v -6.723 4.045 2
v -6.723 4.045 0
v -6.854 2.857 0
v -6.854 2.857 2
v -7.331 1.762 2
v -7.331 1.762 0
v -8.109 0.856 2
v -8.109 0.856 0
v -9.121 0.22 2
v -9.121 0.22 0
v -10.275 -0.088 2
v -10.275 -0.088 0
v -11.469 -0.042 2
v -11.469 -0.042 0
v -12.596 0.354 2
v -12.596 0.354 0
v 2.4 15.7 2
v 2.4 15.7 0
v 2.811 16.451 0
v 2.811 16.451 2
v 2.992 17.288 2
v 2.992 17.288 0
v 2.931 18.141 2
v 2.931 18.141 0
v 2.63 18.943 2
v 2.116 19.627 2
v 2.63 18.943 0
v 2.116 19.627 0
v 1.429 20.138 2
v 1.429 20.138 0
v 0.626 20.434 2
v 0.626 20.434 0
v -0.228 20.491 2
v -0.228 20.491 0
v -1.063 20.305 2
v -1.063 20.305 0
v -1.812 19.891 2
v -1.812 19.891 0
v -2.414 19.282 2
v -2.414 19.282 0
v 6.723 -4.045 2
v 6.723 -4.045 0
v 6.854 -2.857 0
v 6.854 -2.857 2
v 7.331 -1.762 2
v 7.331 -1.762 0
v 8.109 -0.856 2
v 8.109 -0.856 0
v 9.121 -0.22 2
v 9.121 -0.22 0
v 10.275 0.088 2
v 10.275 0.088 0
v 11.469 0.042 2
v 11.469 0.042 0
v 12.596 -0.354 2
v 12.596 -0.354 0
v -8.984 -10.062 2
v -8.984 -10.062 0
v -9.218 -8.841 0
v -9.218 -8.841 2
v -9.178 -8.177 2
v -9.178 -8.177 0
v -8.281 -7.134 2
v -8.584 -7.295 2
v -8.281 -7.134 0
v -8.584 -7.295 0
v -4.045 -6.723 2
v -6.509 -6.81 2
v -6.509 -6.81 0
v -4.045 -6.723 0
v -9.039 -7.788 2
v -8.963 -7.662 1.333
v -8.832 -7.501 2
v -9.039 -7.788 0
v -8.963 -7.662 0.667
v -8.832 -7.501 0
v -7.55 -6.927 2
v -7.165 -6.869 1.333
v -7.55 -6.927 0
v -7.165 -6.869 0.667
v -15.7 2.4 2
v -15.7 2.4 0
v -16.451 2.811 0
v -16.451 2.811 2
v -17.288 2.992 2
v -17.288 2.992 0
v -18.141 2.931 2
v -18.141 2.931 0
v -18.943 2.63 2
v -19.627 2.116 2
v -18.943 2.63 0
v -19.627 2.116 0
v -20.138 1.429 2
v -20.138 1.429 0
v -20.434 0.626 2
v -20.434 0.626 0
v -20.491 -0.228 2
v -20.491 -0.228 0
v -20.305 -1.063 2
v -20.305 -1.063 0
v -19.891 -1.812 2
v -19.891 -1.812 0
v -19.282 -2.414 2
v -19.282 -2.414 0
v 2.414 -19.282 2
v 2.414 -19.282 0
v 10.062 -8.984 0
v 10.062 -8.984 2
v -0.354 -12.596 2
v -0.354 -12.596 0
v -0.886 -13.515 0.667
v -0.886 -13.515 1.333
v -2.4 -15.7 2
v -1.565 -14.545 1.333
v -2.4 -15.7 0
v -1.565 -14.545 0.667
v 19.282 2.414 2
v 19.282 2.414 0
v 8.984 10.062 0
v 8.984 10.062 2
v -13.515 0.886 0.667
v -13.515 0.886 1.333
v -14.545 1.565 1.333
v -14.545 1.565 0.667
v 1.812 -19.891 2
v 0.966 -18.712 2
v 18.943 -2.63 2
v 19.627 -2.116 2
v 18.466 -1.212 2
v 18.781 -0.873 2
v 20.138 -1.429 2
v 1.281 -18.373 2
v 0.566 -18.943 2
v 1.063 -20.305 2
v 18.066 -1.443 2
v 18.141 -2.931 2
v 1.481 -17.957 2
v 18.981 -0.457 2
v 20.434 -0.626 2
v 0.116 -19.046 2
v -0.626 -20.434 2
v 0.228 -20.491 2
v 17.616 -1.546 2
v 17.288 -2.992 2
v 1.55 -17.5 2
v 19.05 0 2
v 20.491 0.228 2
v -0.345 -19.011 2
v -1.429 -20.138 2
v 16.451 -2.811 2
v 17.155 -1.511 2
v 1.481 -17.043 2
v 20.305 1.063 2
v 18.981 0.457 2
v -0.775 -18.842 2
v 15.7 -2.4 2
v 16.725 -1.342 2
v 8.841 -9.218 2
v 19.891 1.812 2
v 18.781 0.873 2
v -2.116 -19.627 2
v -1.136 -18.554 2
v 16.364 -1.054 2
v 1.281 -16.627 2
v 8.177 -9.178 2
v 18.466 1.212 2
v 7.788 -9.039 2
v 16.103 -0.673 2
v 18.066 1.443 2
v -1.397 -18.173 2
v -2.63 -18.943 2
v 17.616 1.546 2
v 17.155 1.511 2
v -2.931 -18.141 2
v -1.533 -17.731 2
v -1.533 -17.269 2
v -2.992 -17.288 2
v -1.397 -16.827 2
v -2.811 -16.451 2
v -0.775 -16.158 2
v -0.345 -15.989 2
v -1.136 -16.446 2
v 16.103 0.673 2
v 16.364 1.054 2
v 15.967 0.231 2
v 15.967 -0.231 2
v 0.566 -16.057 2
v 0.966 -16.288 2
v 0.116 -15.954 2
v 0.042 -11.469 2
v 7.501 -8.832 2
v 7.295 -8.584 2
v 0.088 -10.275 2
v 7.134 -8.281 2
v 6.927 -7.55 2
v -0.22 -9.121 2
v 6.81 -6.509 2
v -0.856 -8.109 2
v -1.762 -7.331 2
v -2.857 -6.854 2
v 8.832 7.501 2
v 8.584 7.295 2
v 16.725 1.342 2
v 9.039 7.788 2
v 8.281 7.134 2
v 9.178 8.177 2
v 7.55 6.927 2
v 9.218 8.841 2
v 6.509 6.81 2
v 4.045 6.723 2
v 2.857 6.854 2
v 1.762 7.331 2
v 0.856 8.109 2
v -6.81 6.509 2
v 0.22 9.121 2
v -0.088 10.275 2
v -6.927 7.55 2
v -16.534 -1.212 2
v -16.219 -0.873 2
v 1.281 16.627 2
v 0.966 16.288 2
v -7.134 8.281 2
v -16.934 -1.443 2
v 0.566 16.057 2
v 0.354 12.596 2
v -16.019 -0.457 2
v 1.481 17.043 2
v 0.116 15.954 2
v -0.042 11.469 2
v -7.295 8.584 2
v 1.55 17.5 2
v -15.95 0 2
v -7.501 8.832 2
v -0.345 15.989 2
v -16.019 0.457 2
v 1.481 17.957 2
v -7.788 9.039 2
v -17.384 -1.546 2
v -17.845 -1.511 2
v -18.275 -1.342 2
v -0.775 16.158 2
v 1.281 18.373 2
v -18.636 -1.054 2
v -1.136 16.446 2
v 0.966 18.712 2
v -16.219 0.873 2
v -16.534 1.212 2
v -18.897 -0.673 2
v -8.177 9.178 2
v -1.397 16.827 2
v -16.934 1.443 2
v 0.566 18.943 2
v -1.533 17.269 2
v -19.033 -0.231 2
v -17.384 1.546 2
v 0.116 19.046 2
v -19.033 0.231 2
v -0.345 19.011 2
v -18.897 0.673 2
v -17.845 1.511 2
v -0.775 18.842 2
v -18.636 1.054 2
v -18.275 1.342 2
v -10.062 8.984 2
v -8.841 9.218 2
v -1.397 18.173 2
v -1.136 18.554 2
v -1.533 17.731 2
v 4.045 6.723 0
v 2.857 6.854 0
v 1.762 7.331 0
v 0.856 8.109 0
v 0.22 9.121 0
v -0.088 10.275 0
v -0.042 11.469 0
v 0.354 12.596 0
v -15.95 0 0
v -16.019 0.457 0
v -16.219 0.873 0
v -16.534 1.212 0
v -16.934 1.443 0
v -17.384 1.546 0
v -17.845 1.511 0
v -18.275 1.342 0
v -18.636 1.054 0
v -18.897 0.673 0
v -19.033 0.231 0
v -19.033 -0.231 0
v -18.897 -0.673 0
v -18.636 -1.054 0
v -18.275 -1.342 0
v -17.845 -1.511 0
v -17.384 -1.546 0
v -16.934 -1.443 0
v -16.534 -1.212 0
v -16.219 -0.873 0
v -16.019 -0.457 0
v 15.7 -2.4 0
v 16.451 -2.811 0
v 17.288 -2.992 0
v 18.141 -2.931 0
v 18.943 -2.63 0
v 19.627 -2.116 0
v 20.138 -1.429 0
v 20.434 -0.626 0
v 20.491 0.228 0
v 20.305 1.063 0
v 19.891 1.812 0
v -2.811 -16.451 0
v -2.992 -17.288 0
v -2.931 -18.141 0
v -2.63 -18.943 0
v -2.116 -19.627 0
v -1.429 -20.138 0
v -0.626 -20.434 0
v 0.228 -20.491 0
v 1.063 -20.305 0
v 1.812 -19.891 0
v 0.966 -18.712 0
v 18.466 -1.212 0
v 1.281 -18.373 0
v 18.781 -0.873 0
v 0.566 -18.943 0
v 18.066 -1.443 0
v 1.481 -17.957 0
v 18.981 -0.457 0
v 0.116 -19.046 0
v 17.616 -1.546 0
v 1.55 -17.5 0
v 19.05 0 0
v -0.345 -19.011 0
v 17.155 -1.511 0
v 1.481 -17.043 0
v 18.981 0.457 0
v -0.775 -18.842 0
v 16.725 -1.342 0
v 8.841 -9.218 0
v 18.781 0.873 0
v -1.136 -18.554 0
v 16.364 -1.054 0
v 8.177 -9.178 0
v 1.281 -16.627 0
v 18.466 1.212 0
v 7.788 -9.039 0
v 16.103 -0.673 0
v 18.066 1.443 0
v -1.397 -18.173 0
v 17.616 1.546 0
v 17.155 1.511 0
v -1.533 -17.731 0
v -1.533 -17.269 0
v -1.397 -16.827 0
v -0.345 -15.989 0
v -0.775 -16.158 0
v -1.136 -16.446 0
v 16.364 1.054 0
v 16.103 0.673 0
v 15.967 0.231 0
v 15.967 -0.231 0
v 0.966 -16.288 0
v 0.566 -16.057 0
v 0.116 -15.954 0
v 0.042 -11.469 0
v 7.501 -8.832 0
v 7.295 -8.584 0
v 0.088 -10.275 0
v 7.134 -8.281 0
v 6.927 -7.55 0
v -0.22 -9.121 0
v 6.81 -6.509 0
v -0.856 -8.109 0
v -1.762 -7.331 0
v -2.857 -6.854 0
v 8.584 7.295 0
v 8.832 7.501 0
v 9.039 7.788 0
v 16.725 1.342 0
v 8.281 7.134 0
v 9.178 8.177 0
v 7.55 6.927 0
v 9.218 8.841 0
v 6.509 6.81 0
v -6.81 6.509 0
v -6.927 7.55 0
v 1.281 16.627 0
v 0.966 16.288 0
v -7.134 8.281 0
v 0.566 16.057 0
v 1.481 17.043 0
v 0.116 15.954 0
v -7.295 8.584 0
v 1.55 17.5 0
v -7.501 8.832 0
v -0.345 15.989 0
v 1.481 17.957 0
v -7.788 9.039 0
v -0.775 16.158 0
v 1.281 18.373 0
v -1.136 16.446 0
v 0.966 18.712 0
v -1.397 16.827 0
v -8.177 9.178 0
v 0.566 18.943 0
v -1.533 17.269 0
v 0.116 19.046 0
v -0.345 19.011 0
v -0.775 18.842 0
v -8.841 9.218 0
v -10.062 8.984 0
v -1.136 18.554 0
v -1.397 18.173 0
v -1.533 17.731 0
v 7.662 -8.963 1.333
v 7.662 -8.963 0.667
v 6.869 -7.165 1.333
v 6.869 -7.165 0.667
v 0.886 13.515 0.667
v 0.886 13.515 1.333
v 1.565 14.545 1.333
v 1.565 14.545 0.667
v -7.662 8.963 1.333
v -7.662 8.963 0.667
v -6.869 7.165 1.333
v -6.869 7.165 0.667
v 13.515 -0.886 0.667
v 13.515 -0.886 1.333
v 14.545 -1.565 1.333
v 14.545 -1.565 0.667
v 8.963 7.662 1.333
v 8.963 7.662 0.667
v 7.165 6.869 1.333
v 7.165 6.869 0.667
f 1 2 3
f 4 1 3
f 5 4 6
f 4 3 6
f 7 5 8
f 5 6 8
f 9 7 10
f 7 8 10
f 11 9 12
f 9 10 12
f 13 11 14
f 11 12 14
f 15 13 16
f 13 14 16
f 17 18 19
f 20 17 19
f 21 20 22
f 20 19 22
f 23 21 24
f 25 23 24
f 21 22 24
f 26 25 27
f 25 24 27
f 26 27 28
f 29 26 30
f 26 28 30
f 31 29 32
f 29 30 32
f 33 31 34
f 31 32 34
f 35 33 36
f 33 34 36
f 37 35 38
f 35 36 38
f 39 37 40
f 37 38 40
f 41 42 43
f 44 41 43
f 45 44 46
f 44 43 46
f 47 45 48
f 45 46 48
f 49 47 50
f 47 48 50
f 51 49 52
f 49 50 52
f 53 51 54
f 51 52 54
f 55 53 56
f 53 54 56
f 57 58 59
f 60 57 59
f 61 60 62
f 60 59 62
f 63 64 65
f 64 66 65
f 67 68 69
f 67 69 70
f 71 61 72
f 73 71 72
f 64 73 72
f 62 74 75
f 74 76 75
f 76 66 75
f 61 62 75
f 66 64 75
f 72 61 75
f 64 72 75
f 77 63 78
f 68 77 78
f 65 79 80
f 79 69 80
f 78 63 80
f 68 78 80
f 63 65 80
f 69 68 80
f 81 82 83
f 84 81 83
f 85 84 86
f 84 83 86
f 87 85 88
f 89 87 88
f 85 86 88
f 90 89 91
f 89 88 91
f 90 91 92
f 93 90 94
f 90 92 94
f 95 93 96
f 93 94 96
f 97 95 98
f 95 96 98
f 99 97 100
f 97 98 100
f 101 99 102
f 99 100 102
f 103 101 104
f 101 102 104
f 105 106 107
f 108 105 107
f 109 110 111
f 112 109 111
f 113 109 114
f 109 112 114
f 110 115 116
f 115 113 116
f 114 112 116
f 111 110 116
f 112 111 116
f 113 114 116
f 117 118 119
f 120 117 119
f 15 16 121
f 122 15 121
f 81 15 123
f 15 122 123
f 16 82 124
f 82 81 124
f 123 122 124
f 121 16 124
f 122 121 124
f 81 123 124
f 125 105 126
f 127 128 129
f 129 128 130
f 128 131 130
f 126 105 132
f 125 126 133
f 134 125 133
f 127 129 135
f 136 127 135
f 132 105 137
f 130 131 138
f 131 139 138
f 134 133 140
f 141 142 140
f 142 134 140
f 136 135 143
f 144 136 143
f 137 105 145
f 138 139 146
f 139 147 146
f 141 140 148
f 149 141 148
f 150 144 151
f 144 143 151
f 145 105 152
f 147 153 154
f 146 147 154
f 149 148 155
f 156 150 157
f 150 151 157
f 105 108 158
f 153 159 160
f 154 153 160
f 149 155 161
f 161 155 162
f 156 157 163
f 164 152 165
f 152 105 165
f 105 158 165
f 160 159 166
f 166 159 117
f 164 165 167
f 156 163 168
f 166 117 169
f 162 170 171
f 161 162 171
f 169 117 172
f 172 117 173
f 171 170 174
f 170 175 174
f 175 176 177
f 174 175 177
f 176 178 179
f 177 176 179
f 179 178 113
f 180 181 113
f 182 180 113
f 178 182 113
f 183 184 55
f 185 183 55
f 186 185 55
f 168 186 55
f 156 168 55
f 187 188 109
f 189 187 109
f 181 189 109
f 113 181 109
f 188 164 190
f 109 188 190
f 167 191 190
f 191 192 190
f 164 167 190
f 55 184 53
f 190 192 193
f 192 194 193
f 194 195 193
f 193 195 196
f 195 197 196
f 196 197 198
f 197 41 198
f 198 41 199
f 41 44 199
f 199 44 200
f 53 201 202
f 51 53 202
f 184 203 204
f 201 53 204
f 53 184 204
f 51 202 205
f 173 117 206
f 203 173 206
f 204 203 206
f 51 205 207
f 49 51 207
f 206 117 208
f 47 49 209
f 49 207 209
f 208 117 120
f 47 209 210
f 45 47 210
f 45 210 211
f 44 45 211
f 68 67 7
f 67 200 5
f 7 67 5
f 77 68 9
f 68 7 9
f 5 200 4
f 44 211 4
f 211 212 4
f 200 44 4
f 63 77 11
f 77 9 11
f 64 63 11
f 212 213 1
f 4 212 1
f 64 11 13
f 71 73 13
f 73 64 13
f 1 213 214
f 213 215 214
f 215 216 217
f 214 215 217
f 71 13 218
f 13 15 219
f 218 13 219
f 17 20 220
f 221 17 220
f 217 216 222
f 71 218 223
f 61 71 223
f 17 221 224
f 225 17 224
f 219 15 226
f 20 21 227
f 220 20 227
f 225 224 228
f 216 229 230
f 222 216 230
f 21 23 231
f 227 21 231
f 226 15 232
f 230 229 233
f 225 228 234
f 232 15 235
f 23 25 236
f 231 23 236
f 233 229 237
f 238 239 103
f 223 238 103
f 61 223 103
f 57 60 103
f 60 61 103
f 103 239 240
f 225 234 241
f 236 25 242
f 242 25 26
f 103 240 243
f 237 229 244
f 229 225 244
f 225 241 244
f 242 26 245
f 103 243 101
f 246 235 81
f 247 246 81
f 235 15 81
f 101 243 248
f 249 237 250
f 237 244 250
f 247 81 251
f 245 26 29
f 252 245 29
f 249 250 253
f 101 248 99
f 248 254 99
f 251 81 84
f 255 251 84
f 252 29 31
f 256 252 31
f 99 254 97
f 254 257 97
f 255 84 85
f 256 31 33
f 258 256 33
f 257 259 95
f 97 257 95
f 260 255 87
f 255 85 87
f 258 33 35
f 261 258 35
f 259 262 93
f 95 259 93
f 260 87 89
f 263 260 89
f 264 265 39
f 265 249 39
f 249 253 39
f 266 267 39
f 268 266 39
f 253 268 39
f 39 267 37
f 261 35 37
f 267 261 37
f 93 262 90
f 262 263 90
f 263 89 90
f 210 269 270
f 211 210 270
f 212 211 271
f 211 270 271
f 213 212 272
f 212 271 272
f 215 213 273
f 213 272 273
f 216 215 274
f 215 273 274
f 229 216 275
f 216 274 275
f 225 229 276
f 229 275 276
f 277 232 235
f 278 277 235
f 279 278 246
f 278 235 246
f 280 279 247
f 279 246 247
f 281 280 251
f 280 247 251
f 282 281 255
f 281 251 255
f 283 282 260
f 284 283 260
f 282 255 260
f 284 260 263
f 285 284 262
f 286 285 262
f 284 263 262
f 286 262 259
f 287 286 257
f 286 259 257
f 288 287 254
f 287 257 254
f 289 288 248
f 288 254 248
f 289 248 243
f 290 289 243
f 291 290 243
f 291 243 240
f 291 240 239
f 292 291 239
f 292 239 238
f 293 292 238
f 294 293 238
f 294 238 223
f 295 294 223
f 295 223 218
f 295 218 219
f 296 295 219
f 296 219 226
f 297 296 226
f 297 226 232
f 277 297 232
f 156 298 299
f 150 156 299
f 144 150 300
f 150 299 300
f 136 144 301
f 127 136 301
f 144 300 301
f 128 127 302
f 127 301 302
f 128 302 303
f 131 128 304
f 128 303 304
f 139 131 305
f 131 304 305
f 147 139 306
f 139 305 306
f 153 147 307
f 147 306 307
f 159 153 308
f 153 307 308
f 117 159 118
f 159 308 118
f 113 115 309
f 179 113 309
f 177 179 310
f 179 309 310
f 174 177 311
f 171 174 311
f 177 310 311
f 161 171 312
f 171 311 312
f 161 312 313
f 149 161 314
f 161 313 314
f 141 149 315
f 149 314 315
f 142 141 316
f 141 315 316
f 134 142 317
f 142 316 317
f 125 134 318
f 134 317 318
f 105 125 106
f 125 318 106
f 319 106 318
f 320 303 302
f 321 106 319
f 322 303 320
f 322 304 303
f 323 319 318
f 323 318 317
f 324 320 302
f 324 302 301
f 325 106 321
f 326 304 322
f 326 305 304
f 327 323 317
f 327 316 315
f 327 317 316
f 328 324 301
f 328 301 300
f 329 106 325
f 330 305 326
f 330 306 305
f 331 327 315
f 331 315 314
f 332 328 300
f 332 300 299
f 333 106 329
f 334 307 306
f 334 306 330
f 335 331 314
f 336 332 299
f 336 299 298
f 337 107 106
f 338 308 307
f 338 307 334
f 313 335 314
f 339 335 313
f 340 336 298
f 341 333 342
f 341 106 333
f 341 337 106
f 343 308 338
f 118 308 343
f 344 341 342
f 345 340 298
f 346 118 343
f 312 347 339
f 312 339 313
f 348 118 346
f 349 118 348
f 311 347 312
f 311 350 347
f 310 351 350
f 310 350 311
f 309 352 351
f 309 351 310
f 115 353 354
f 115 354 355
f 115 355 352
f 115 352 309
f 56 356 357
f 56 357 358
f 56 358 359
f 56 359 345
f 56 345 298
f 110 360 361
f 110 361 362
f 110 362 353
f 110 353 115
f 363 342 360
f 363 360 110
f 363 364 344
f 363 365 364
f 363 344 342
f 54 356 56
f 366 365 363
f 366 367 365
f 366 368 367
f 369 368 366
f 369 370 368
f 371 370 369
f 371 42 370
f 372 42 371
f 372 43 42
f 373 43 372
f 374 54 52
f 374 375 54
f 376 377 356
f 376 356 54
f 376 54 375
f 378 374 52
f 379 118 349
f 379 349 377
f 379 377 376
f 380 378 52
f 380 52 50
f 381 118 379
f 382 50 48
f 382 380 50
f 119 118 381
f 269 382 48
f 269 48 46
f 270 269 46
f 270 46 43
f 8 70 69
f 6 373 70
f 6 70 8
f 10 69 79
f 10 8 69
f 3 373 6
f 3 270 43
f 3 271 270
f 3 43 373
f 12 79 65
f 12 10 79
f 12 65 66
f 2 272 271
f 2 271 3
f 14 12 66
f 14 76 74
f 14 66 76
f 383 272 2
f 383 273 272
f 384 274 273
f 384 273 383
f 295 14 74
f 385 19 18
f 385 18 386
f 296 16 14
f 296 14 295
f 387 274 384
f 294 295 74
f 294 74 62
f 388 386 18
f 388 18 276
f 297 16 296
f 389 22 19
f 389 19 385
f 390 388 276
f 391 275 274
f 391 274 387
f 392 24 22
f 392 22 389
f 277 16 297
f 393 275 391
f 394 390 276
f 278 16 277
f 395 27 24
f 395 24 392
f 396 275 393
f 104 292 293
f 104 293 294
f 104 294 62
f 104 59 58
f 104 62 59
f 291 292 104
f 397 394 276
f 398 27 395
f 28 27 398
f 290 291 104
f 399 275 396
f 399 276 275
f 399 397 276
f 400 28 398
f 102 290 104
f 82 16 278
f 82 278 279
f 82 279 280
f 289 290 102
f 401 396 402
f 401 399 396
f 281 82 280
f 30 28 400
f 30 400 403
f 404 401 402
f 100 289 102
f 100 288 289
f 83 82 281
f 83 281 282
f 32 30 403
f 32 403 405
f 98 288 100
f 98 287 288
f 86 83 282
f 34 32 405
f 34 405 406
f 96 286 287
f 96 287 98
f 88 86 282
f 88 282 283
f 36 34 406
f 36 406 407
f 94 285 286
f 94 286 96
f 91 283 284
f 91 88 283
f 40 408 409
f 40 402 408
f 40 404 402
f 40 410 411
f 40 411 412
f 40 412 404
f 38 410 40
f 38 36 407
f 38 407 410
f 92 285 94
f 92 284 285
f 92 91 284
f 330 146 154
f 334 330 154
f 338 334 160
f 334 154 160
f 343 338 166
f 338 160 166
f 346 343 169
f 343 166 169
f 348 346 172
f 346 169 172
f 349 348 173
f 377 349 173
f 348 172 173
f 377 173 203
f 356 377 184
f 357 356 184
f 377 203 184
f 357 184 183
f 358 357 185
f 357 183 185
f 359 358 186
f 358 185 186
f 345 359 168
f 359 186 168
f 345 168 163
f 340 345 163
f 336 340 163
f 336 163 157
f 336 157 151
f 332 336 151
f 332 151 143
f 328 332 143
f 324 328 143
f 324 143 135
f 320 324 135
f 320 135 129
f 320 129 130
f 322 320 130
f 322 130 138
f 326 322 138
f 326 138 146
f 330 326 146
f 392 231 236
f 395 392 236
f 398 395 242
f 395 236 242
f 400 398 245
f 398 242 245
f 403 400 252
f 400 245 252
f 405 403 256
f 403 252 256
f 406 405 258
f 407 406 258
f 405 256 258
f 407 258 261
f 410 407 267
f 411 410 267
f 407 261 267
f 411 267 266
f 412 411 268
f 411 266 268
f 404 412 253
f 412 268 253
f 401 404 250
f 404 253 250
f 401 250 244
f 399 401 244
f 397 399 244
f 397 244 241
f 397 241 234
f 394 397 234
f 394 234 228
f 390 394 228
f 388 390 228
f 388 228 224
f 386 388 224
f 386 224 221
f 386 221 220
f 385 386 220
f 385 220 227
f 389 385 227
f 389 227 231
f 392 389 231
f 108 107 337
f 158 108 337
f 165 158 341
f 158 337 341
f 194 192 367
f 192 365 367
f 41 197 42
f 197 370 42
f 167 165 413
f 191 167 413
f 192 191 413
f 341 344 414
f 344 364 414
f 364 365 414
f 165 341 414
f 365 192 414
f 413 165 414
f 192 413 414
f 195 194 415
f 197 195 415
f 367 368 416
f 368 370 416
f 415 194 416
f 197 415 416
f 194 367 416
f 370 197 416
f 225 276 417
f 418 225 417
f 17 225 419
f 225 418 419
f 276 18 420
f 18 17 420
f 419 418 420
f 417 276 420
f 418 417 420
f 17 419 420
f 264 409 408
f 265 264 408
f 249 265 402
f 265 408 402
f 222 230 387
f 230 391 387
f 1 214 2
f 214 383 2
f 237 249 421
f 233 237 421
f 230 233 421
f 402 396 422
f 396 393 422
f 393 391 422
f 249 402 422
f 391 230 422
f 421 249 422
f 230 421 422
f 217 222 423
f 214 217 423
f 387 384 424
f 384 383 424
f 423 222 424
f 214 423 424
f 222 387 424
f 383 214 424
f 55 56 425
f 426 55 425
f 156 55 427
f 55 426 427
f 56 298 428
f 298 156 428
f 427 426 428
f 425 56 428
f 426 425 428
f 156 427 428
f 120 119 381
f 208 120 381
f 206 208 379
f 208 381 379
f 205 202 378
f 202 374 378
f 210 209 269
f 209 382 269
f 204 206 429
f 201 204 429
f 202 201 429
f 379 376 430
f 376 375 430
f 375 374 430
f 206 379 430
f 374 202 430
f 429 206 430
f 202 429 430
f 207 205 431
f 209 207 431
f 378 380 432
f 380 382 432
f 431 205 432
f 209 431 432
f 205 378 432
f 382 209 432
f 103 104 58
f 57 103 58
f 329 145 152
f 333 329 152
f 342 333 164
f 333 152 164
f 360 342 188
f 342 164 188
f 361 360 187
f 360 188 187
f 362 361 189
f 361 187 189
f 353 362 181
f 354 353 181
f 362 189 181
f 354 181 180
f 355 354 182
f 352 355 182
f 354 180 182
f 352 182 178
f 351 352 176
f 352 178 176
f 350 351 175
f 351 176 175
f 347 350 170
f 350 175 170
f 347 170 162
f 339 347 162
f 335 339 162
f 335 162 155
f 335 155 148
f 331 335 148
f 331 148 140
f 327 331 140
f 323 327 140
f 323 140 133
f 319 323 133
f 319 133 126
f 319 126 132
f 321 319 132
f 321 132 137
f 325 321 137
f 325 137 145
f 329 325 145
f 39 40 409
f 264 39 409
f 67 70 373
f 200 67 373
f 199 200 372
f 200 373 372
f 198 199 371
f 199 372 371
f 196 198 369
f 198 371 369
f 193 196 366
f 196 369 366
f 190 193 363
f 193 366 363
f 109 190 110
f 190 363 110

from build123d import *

# Parameters (mm, degrees)
SZKIC1_R                    = 3
SZKIC1_R_2                  = 6
DODANIE_WYCI_GNI_CIE1_DEPTH = 2
SZYK_KO_OWY1_COUNT          = 4
ZAOKR_GLENIE1_DEPTH         = 2
SZKIC2_R                    = 1.55
WYTNIJ_WYCI_GNI_CIE1_DEPTH  = 30.060282321


with BuildPart() as part:
    # Szkic1 → Dodanie-wyciągnięcie1 (new body)
    with BuildSketch(Plane.XY):
        with BuildLine():
            ThreePointArc((2.400147918, 15.700197241), (-1.790710564, 15.093060932), (-2.413695775, 19.281592745))
            Line((-2.413695775, 19.281592745), (-10.062410419, 8.983603822))
            add(Edge.make_bspline(
                [(-10.062410419, 8.983603822), (-4.760498221, 10.518777319), (-8.176009399, 4.470768002), (-5.592129953, -2.174415459)],
                knots=[0, 0, 0, 0, 1, 1, 1, 1], degree=3))
            ThreePointArc((-5.592129953, -2.174415459), (-3.27017187, 5.030504541), (4.257024291, 4.228208153))
            add(Edge.make_bspline(
                [(4.257024291, 4.228208153), (0.108817482, 8.404685875), (-2.964269427, 8.546416052), (2.400147918, 15.700197241)],
                knots=[0, 0, 0, 0, 1, 1, 1, 1], degree=3))
        make_face()
        with Locations((0, 17.5)):
            Circle(SZKIC1_R)
        Circle(SZKIC1_R_2)
    dodanie_wyci_gni_cie1 = extrude(amount=DODANIE_WYCI_GNI_CIE1_DEPTH)

    # Szyk kołowy1: Dodanie-wyciągnięcie1 ×4 about axis
    szyk_ko_owy1_axis = Axis((0, 0, 0), (0, 0, -1))
    for i in range(1, SZYK_KO_OWY1_COUNT):
        add(dodanie_wyci_gni_cie1.rotate(szyk_ko_owy1_axis, i * 360 / SZYK_KO_OWY1_COUNT))

    # Zaokrąglenie1: read off the stored shape, not the designer's step
    # Zaokrąglenie1 outline → Zaokrąglenie1 (add)
    with BuildSketch(Plane.XY):
        with BuildLine():
            add(Edge.make_bspline(
                [(-6.722543952, 4.044752518), (-6.693847694, 3.317092727), (-6.646227592, 2.537215945), (-6.544838162, 1.721663177)],
                knots=[0.664728108, 0.664728108, 0.664728108, 0.664728108, 0.79801197, 0.79801197, 0.79801197, 0.79801197], degree=3))
            ThreePointArc((-6.722543952, 4.044752518), (-8.59130438, 0.500235564), (-12.595628187, 0.354438378))
            add(Edge.make_bspline(
                [(-6.544838162, 1.721663177), (-8.318139153, -0.279379709), (-9.515072999, -1.281625971), (-12.595628187, 0.354438378)],
                knots=[0.223227171, 0.223227171, 0.223227171, 0.223227171, 0.829356845, 0.829356845, 0.829356845, 0.829356845], degree=3))
        make_face()
        with BuildLine():
            add(Edge.make_bspline(
                [(-4.044752518, -6.722543952), (-3.317092725, -6.693847694), (-2.537215942, -6.646227592), (-1.721663172, -6.544838162)],
                knots=[0.664728108, 0.664728108, 0.664728108, 0.664728108, 0.79801197, 0.79801197, 0.79801197, 0.79801197], degree=3))
            ThreePointArc((-4.044752518, -6.722543952), (-0.500235564, -8.59130438), (-0.354438378, -12.595628187))
            add(Edge.make_bspline(
                [(-1.721663172, -6.544838162), (0.279379709, -8.318139153), (1.281625971, -9.515072999), (-0.354438378, -12.595628187)],
                knots=[0.223227171, 0.223227171, 0.223227171, 0.223227171, 0.829356845, 0.829356845, 0.829356845, 0.829356845], degree=3))
        make_face()
        with BuildLine():
            add(Edge.make_bspline(
                [(6.722543952, -4.044752518), (6.693847694, -3.317092727), (6.646227592, -2.537215945), (6.544838162, -1.721663177)],
                knots=[0.664728108, 0.664728108, 0.664728108, 0.664728108, 0.79801197, 0.79801197, 0.79801197, 0.79801197], degree=3))
            ThreePointArc((6.722543952, -4.044752518), (8.59130438, -0.500235564), (12.595628187, -0.354438378))
            add(Edge.make_bspline(
                [(6.544838162, -1.721663177), (8.318139153, 0.279379709), (9.515072999, 1.281625971), (12.595628187, -0.354438378)],
                knots=[0.223227171, 0.223227171, 0.223227171, 0.223227171, 0.829356845, 0.829356845, 0.829356845, 0.829356845], degree=3))
        make_face()
        with BuildLine():
            add(Edge.make_bspline(
                [(4.044752518, 6.722543952), (3.317092727, 6.693847694), (2.537215945, 6.646227592), (1.721663177, 6.544838162)],
                knots=[0.664728108, 0.664728108, 0.664728108, 0.664728108, 0.79801197, 0.79801197, 0.79801197, 0.79801197], degree=3))
            ThreePointArc((4.044752518, 6.722543952), (0.500235564, 8.59130438), (0.354438378, 12.595628187))
            add(Edge.make_bspline(
                [(1.721663177, 6.544838162), (-0.279379709, 8.318139153), (-1.281625971, 9.515072999), (0.354438378, 12.595628187)],
                knots=[0.223227171, 0.223227171, 0.223227171, 0.223227171, 0.829356845, 0.829356845, 0.829356845, 0.829356845], degree=3))
        make_face()
    extrude(amount=ZAOKR_GLENIE1_DEPTH)

    # Szkic2 → Wytnij-wyciągnięcie1 (cut, through all)
    with BuildSketch(Plane.XY.offset(2)):
        with Locations((0, 17.5)):
            Circle(SZKIC2_R)
        with Locations((17.5, 0)):
            Circle(SZKIC2_R)
        with Locations((0, -17.5)):
            Circle(SZKIC2_R)
        with Locations((-17.5, 0)):
            Circle(SZKIC2_R)
    extrude(amount=-WYTNIJ_WYCI_GNI_CIE1_DEPTH, mode=Mode.SUBTRACT)


solid = part.part
